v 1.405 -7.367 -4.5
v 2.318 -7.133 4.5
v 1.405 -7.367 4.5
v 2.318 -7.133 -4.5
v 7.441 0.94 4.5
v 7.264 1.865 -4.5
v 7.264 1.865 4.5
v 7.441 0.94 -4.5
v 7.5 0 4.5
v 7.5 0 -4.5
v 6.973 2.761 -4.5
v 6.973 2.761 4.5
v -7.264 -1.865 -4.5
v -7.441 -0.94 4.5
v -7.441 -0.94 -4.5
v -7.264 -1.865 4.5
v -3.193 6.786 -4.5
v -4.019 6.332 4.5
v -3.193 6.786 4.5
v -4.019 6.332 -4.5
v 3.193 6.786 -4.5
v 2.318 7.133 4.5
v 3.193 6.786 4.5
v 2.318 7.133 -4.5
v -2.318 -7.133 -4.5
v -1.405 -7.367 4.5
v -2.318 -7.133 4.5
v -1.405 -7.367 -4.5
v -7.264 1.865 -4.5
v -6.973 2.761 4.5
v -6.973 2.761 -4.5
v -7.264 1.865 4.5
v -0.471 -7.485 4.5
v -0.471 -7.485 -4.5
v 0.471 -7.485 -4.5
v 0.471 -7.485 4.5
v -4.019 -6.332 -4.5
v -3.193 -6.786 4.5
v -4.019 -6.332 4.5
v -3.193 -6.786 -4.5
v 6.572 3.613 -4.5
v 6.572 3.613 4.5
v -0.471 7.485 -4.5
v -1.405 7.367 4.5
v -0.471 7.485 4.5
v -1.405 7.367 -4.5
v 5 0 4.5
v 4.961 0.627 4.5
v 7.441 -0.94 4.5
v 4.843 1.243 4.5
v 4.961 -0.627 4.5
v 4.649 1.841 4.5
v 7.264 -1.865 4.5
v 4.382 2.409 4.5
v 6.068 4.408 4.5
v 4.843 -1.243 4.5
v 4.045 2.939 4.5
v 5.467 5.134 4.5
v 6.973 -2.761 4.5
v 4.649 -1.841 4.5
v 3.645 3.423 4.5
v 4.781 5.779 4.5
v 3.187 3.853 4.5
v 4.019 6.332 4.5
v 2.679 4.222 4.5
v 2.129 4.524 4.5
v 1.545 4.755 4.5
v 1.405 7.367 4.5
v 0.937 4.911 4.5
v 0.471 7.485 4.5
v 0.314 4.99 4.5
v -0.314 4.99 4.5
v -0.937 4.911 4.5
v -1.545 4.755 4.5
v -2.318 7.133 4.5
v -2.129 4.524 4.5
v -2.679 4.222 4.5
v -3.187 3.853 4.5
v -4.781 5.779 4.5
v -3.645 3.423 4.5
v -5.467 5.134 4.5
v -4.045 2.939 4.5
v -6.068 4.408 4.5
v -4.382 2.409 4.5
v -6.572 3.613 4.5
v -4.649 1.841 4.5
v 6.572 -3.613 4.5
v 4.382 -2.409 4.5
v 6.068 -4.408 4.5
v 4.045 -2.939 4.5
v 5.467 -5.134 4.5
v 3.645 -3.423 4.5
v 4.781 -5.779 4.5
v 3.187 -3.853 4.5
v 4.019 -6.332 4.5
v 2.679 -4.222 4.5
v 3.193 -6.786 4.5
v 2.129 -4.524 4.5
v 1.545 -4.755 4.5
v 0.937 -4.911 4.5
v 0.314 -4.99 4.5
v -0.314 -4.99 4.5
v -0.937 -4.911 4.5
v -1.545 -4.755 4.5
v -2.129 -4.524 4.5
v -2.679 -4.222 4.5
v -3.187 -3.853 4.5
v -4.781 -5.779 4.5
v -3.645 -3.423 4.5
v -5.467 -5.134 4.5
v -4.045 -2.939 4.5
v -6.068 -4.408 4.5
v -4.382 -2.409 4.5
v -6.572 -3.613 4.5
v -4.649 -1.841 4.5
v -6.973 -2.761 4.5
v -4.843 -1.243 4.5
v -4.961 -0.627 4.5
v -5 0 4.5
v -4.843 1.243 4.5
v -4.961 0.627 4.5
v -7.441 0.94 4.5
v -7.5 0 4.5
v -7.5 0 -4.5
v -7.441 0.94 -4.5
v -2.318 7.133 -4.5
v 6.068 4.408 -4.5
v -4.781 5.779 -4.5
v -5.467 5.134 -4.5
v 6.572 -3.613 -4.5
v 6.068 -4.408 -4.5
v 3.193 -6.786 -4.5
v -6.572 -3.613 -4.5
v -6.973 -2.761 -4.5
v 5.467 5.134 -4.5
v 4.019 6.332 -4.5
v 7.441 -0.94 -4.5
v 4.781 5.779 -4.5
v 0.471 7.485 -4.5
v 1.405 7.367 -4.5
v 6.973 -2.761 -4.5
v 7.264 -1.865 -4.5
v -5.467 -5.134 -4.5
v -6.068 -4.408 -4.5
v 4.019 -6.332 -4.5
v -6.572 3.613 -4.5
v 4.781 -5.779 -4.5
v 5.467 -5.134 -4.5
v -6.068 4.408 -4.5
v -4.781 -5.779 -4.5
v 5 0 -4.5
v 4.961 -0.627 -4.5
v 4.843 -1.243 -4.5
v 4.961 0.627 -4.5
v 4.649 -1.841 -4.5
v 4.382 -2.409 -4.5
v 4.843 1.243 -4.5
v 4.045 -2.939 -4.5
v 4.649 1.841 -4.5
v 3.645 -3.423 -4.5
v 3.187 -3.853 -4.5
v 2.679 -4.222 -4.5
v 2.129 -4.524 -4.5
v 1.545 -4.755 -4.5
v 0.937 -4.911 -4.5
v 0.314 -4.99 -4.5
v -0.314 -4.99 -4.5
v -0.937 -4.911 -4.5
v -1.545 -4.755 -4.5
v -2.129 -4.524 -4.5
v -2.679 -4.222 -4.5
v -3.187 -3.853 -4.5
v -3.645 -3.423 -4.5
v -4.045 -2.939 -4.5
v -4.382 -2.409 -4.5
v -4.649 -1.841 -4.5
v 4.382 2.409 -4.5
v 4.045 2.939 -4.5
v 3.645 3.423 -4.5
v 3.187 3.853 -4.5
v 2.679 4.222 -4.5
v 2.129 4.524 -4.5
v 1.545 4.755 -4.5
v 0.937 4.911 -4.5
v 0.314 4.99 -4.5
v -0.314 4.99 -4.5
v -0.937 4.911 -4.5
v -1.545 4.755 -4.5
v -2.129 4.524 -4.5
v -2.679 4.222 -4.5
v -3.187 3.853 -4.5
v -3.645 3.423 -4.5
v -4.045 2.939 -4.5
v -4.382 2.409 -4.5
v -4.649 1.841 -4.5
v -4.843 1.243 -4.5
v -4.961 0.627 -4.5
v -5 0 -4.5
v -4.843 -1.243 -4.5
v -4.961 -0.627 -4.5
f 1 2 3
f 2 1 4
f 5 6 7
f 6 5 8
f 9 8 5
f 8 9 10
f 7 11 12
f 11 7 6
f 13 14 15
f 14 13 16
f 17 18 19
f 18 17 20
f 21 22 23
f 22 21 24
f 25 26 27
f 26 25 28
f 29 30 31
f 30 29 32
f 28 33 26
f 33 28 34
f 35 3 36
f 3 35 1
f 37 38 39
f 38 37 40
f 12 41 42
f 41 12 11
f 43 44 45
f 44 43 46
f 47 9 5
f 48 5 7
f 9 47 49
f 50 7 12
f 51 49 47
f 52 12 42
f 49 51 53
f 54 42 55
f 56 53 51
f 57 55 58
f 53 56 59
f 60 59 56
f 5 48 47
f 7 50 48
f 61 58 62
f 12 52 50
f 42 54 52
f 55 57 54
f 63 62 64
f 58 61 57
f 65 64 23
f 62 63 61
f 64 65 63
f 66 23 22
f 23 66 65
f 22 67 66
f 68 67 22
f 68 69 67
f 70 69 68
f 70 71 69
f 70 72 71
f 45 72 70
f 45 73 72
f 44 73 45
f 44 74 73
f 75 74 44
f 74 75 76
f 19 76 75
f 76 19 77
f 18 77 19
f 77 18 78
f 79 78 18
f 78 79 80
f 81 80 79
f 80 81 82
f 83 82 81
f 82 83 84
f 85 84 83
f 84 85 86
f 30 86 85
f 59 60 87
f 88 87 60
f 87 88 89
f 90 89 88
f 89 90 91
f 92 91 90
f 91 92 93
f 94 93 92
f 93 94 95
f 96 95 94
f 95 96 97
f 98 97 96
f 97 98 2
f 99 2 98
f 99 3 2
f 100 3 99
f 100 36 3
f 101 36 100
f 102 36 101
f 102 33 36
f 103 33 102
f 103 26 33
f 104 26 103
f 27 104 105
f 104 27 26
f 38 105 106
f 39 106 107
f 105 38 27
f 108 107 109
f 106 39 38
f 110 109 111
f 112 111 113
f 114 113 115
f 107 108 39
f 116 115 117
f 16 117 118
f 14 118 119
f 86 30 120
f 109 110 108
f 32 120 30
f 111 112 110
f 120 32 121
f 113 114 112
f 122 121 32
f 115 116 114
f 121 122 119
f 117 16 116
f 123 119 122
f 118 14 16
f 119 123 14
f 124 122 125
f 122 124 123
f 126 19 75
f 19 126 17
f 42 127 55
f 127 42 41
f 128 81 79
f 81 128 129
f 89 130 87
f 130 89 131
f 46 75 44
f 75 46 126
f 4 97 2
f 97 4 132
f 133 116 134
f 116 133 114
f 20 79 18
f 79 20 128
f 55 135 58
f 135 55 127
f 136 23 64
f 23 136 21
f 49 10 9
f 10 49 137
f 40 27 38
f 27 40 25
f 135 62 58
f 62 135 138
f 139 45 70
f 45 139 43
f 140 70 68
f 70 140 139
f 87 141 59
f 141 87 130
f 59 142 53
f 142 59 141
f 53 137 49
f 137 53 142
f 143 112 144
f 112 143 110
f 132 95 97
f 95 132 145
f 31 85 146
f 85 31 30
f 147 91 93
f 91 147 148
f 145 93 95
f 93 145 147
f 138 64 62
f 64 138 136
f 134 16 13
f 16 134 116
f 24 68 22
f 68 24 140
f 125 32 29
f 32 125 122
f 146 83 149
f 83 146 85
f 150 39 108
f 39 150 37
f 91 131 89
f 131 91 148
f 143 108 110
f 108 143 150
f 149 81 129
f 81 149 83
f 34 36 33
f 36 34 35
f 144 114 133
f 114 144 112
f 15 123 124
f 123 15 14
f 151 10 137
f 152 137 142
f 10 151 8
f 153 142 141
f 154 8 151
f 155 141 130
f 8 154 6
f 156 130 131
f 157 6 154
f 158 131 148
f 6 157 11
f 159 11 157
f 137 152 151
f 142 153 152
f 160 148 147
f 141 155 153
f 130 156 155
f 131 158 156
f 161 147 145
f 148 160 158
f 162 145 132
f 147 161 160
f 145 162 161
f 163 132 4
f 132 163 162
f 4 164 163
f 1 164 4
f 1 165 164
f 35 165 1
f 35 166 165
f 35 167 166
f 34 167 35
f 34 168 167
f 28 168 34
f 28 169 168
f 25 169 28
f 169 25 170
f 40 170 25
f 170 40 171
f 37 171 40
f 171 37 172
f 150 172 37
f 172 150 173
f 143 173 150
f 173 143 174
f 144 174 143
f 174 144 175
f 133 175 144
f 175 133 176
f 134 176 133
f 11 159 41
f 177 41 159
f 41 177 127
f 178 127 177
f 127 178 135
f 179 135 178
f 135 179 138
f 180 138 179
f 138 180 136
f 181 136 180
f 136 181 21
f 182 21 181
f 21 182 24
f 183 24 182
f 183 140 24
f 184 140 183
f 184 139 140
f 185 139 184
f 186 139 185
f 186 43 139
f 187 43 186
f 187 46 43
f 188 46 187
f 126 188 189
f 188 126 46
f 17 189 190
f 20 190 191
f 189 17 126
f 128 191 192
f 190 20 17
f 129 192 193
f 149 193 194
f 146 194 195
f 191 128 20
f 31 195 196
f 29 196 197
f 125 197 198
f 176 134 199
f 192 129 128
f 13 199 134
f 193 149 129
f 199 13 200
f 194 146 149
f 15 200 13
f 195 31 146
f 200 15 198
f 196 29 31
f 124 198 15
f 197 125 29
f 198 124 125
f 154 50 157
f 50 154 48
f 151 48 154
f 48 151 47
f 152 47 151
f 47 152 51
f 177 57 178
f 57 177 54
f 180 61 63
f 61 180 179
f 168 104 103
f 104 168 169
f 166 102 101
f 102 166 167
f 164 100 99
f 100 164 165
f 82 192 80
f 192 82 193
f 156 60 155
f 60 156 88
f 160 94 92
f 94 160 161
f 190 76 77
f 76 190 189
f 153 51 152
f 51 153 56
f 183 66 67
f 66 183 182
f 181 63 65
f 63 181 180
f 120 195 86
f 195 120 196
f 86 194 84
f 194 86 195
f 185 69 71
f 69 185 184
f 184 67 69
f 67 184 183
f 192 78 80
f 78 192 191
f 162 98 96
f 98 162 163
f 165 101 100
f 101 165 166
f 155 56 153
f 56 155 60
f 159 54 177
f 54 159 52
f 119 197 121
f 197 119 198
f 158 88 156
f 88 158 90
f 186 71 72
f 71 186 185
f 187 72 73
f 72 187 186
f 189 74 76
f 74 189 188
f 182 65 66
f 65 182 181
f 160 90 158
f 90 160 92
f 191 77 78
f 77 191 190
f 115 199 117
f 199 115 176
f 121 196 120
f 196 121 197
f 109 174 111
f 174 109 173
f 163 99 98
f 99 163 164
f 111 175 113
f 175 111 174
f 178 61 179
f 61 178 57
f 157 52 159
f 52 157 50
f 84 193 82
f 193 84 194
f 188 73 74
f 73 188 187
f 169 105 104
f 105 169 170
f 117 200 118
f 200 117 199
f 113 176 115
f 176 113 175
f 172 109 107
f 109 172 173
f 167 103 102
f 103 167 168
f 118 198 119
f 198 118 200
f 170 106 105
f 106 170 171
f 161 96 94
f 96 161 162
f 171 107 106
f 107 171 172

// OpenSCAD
$fn = 50;


difference() {
	union() {
		translate(v = [0, 0, -4.5000000000]) {
			cylinder(h = 9, r = 7.5000000000);
		}
	}
	union() {
		translate(v = [0, 0, -100.0000000000]) {
			cylinder(h = 200, r = 5.0000000000);
		}
	}
}
